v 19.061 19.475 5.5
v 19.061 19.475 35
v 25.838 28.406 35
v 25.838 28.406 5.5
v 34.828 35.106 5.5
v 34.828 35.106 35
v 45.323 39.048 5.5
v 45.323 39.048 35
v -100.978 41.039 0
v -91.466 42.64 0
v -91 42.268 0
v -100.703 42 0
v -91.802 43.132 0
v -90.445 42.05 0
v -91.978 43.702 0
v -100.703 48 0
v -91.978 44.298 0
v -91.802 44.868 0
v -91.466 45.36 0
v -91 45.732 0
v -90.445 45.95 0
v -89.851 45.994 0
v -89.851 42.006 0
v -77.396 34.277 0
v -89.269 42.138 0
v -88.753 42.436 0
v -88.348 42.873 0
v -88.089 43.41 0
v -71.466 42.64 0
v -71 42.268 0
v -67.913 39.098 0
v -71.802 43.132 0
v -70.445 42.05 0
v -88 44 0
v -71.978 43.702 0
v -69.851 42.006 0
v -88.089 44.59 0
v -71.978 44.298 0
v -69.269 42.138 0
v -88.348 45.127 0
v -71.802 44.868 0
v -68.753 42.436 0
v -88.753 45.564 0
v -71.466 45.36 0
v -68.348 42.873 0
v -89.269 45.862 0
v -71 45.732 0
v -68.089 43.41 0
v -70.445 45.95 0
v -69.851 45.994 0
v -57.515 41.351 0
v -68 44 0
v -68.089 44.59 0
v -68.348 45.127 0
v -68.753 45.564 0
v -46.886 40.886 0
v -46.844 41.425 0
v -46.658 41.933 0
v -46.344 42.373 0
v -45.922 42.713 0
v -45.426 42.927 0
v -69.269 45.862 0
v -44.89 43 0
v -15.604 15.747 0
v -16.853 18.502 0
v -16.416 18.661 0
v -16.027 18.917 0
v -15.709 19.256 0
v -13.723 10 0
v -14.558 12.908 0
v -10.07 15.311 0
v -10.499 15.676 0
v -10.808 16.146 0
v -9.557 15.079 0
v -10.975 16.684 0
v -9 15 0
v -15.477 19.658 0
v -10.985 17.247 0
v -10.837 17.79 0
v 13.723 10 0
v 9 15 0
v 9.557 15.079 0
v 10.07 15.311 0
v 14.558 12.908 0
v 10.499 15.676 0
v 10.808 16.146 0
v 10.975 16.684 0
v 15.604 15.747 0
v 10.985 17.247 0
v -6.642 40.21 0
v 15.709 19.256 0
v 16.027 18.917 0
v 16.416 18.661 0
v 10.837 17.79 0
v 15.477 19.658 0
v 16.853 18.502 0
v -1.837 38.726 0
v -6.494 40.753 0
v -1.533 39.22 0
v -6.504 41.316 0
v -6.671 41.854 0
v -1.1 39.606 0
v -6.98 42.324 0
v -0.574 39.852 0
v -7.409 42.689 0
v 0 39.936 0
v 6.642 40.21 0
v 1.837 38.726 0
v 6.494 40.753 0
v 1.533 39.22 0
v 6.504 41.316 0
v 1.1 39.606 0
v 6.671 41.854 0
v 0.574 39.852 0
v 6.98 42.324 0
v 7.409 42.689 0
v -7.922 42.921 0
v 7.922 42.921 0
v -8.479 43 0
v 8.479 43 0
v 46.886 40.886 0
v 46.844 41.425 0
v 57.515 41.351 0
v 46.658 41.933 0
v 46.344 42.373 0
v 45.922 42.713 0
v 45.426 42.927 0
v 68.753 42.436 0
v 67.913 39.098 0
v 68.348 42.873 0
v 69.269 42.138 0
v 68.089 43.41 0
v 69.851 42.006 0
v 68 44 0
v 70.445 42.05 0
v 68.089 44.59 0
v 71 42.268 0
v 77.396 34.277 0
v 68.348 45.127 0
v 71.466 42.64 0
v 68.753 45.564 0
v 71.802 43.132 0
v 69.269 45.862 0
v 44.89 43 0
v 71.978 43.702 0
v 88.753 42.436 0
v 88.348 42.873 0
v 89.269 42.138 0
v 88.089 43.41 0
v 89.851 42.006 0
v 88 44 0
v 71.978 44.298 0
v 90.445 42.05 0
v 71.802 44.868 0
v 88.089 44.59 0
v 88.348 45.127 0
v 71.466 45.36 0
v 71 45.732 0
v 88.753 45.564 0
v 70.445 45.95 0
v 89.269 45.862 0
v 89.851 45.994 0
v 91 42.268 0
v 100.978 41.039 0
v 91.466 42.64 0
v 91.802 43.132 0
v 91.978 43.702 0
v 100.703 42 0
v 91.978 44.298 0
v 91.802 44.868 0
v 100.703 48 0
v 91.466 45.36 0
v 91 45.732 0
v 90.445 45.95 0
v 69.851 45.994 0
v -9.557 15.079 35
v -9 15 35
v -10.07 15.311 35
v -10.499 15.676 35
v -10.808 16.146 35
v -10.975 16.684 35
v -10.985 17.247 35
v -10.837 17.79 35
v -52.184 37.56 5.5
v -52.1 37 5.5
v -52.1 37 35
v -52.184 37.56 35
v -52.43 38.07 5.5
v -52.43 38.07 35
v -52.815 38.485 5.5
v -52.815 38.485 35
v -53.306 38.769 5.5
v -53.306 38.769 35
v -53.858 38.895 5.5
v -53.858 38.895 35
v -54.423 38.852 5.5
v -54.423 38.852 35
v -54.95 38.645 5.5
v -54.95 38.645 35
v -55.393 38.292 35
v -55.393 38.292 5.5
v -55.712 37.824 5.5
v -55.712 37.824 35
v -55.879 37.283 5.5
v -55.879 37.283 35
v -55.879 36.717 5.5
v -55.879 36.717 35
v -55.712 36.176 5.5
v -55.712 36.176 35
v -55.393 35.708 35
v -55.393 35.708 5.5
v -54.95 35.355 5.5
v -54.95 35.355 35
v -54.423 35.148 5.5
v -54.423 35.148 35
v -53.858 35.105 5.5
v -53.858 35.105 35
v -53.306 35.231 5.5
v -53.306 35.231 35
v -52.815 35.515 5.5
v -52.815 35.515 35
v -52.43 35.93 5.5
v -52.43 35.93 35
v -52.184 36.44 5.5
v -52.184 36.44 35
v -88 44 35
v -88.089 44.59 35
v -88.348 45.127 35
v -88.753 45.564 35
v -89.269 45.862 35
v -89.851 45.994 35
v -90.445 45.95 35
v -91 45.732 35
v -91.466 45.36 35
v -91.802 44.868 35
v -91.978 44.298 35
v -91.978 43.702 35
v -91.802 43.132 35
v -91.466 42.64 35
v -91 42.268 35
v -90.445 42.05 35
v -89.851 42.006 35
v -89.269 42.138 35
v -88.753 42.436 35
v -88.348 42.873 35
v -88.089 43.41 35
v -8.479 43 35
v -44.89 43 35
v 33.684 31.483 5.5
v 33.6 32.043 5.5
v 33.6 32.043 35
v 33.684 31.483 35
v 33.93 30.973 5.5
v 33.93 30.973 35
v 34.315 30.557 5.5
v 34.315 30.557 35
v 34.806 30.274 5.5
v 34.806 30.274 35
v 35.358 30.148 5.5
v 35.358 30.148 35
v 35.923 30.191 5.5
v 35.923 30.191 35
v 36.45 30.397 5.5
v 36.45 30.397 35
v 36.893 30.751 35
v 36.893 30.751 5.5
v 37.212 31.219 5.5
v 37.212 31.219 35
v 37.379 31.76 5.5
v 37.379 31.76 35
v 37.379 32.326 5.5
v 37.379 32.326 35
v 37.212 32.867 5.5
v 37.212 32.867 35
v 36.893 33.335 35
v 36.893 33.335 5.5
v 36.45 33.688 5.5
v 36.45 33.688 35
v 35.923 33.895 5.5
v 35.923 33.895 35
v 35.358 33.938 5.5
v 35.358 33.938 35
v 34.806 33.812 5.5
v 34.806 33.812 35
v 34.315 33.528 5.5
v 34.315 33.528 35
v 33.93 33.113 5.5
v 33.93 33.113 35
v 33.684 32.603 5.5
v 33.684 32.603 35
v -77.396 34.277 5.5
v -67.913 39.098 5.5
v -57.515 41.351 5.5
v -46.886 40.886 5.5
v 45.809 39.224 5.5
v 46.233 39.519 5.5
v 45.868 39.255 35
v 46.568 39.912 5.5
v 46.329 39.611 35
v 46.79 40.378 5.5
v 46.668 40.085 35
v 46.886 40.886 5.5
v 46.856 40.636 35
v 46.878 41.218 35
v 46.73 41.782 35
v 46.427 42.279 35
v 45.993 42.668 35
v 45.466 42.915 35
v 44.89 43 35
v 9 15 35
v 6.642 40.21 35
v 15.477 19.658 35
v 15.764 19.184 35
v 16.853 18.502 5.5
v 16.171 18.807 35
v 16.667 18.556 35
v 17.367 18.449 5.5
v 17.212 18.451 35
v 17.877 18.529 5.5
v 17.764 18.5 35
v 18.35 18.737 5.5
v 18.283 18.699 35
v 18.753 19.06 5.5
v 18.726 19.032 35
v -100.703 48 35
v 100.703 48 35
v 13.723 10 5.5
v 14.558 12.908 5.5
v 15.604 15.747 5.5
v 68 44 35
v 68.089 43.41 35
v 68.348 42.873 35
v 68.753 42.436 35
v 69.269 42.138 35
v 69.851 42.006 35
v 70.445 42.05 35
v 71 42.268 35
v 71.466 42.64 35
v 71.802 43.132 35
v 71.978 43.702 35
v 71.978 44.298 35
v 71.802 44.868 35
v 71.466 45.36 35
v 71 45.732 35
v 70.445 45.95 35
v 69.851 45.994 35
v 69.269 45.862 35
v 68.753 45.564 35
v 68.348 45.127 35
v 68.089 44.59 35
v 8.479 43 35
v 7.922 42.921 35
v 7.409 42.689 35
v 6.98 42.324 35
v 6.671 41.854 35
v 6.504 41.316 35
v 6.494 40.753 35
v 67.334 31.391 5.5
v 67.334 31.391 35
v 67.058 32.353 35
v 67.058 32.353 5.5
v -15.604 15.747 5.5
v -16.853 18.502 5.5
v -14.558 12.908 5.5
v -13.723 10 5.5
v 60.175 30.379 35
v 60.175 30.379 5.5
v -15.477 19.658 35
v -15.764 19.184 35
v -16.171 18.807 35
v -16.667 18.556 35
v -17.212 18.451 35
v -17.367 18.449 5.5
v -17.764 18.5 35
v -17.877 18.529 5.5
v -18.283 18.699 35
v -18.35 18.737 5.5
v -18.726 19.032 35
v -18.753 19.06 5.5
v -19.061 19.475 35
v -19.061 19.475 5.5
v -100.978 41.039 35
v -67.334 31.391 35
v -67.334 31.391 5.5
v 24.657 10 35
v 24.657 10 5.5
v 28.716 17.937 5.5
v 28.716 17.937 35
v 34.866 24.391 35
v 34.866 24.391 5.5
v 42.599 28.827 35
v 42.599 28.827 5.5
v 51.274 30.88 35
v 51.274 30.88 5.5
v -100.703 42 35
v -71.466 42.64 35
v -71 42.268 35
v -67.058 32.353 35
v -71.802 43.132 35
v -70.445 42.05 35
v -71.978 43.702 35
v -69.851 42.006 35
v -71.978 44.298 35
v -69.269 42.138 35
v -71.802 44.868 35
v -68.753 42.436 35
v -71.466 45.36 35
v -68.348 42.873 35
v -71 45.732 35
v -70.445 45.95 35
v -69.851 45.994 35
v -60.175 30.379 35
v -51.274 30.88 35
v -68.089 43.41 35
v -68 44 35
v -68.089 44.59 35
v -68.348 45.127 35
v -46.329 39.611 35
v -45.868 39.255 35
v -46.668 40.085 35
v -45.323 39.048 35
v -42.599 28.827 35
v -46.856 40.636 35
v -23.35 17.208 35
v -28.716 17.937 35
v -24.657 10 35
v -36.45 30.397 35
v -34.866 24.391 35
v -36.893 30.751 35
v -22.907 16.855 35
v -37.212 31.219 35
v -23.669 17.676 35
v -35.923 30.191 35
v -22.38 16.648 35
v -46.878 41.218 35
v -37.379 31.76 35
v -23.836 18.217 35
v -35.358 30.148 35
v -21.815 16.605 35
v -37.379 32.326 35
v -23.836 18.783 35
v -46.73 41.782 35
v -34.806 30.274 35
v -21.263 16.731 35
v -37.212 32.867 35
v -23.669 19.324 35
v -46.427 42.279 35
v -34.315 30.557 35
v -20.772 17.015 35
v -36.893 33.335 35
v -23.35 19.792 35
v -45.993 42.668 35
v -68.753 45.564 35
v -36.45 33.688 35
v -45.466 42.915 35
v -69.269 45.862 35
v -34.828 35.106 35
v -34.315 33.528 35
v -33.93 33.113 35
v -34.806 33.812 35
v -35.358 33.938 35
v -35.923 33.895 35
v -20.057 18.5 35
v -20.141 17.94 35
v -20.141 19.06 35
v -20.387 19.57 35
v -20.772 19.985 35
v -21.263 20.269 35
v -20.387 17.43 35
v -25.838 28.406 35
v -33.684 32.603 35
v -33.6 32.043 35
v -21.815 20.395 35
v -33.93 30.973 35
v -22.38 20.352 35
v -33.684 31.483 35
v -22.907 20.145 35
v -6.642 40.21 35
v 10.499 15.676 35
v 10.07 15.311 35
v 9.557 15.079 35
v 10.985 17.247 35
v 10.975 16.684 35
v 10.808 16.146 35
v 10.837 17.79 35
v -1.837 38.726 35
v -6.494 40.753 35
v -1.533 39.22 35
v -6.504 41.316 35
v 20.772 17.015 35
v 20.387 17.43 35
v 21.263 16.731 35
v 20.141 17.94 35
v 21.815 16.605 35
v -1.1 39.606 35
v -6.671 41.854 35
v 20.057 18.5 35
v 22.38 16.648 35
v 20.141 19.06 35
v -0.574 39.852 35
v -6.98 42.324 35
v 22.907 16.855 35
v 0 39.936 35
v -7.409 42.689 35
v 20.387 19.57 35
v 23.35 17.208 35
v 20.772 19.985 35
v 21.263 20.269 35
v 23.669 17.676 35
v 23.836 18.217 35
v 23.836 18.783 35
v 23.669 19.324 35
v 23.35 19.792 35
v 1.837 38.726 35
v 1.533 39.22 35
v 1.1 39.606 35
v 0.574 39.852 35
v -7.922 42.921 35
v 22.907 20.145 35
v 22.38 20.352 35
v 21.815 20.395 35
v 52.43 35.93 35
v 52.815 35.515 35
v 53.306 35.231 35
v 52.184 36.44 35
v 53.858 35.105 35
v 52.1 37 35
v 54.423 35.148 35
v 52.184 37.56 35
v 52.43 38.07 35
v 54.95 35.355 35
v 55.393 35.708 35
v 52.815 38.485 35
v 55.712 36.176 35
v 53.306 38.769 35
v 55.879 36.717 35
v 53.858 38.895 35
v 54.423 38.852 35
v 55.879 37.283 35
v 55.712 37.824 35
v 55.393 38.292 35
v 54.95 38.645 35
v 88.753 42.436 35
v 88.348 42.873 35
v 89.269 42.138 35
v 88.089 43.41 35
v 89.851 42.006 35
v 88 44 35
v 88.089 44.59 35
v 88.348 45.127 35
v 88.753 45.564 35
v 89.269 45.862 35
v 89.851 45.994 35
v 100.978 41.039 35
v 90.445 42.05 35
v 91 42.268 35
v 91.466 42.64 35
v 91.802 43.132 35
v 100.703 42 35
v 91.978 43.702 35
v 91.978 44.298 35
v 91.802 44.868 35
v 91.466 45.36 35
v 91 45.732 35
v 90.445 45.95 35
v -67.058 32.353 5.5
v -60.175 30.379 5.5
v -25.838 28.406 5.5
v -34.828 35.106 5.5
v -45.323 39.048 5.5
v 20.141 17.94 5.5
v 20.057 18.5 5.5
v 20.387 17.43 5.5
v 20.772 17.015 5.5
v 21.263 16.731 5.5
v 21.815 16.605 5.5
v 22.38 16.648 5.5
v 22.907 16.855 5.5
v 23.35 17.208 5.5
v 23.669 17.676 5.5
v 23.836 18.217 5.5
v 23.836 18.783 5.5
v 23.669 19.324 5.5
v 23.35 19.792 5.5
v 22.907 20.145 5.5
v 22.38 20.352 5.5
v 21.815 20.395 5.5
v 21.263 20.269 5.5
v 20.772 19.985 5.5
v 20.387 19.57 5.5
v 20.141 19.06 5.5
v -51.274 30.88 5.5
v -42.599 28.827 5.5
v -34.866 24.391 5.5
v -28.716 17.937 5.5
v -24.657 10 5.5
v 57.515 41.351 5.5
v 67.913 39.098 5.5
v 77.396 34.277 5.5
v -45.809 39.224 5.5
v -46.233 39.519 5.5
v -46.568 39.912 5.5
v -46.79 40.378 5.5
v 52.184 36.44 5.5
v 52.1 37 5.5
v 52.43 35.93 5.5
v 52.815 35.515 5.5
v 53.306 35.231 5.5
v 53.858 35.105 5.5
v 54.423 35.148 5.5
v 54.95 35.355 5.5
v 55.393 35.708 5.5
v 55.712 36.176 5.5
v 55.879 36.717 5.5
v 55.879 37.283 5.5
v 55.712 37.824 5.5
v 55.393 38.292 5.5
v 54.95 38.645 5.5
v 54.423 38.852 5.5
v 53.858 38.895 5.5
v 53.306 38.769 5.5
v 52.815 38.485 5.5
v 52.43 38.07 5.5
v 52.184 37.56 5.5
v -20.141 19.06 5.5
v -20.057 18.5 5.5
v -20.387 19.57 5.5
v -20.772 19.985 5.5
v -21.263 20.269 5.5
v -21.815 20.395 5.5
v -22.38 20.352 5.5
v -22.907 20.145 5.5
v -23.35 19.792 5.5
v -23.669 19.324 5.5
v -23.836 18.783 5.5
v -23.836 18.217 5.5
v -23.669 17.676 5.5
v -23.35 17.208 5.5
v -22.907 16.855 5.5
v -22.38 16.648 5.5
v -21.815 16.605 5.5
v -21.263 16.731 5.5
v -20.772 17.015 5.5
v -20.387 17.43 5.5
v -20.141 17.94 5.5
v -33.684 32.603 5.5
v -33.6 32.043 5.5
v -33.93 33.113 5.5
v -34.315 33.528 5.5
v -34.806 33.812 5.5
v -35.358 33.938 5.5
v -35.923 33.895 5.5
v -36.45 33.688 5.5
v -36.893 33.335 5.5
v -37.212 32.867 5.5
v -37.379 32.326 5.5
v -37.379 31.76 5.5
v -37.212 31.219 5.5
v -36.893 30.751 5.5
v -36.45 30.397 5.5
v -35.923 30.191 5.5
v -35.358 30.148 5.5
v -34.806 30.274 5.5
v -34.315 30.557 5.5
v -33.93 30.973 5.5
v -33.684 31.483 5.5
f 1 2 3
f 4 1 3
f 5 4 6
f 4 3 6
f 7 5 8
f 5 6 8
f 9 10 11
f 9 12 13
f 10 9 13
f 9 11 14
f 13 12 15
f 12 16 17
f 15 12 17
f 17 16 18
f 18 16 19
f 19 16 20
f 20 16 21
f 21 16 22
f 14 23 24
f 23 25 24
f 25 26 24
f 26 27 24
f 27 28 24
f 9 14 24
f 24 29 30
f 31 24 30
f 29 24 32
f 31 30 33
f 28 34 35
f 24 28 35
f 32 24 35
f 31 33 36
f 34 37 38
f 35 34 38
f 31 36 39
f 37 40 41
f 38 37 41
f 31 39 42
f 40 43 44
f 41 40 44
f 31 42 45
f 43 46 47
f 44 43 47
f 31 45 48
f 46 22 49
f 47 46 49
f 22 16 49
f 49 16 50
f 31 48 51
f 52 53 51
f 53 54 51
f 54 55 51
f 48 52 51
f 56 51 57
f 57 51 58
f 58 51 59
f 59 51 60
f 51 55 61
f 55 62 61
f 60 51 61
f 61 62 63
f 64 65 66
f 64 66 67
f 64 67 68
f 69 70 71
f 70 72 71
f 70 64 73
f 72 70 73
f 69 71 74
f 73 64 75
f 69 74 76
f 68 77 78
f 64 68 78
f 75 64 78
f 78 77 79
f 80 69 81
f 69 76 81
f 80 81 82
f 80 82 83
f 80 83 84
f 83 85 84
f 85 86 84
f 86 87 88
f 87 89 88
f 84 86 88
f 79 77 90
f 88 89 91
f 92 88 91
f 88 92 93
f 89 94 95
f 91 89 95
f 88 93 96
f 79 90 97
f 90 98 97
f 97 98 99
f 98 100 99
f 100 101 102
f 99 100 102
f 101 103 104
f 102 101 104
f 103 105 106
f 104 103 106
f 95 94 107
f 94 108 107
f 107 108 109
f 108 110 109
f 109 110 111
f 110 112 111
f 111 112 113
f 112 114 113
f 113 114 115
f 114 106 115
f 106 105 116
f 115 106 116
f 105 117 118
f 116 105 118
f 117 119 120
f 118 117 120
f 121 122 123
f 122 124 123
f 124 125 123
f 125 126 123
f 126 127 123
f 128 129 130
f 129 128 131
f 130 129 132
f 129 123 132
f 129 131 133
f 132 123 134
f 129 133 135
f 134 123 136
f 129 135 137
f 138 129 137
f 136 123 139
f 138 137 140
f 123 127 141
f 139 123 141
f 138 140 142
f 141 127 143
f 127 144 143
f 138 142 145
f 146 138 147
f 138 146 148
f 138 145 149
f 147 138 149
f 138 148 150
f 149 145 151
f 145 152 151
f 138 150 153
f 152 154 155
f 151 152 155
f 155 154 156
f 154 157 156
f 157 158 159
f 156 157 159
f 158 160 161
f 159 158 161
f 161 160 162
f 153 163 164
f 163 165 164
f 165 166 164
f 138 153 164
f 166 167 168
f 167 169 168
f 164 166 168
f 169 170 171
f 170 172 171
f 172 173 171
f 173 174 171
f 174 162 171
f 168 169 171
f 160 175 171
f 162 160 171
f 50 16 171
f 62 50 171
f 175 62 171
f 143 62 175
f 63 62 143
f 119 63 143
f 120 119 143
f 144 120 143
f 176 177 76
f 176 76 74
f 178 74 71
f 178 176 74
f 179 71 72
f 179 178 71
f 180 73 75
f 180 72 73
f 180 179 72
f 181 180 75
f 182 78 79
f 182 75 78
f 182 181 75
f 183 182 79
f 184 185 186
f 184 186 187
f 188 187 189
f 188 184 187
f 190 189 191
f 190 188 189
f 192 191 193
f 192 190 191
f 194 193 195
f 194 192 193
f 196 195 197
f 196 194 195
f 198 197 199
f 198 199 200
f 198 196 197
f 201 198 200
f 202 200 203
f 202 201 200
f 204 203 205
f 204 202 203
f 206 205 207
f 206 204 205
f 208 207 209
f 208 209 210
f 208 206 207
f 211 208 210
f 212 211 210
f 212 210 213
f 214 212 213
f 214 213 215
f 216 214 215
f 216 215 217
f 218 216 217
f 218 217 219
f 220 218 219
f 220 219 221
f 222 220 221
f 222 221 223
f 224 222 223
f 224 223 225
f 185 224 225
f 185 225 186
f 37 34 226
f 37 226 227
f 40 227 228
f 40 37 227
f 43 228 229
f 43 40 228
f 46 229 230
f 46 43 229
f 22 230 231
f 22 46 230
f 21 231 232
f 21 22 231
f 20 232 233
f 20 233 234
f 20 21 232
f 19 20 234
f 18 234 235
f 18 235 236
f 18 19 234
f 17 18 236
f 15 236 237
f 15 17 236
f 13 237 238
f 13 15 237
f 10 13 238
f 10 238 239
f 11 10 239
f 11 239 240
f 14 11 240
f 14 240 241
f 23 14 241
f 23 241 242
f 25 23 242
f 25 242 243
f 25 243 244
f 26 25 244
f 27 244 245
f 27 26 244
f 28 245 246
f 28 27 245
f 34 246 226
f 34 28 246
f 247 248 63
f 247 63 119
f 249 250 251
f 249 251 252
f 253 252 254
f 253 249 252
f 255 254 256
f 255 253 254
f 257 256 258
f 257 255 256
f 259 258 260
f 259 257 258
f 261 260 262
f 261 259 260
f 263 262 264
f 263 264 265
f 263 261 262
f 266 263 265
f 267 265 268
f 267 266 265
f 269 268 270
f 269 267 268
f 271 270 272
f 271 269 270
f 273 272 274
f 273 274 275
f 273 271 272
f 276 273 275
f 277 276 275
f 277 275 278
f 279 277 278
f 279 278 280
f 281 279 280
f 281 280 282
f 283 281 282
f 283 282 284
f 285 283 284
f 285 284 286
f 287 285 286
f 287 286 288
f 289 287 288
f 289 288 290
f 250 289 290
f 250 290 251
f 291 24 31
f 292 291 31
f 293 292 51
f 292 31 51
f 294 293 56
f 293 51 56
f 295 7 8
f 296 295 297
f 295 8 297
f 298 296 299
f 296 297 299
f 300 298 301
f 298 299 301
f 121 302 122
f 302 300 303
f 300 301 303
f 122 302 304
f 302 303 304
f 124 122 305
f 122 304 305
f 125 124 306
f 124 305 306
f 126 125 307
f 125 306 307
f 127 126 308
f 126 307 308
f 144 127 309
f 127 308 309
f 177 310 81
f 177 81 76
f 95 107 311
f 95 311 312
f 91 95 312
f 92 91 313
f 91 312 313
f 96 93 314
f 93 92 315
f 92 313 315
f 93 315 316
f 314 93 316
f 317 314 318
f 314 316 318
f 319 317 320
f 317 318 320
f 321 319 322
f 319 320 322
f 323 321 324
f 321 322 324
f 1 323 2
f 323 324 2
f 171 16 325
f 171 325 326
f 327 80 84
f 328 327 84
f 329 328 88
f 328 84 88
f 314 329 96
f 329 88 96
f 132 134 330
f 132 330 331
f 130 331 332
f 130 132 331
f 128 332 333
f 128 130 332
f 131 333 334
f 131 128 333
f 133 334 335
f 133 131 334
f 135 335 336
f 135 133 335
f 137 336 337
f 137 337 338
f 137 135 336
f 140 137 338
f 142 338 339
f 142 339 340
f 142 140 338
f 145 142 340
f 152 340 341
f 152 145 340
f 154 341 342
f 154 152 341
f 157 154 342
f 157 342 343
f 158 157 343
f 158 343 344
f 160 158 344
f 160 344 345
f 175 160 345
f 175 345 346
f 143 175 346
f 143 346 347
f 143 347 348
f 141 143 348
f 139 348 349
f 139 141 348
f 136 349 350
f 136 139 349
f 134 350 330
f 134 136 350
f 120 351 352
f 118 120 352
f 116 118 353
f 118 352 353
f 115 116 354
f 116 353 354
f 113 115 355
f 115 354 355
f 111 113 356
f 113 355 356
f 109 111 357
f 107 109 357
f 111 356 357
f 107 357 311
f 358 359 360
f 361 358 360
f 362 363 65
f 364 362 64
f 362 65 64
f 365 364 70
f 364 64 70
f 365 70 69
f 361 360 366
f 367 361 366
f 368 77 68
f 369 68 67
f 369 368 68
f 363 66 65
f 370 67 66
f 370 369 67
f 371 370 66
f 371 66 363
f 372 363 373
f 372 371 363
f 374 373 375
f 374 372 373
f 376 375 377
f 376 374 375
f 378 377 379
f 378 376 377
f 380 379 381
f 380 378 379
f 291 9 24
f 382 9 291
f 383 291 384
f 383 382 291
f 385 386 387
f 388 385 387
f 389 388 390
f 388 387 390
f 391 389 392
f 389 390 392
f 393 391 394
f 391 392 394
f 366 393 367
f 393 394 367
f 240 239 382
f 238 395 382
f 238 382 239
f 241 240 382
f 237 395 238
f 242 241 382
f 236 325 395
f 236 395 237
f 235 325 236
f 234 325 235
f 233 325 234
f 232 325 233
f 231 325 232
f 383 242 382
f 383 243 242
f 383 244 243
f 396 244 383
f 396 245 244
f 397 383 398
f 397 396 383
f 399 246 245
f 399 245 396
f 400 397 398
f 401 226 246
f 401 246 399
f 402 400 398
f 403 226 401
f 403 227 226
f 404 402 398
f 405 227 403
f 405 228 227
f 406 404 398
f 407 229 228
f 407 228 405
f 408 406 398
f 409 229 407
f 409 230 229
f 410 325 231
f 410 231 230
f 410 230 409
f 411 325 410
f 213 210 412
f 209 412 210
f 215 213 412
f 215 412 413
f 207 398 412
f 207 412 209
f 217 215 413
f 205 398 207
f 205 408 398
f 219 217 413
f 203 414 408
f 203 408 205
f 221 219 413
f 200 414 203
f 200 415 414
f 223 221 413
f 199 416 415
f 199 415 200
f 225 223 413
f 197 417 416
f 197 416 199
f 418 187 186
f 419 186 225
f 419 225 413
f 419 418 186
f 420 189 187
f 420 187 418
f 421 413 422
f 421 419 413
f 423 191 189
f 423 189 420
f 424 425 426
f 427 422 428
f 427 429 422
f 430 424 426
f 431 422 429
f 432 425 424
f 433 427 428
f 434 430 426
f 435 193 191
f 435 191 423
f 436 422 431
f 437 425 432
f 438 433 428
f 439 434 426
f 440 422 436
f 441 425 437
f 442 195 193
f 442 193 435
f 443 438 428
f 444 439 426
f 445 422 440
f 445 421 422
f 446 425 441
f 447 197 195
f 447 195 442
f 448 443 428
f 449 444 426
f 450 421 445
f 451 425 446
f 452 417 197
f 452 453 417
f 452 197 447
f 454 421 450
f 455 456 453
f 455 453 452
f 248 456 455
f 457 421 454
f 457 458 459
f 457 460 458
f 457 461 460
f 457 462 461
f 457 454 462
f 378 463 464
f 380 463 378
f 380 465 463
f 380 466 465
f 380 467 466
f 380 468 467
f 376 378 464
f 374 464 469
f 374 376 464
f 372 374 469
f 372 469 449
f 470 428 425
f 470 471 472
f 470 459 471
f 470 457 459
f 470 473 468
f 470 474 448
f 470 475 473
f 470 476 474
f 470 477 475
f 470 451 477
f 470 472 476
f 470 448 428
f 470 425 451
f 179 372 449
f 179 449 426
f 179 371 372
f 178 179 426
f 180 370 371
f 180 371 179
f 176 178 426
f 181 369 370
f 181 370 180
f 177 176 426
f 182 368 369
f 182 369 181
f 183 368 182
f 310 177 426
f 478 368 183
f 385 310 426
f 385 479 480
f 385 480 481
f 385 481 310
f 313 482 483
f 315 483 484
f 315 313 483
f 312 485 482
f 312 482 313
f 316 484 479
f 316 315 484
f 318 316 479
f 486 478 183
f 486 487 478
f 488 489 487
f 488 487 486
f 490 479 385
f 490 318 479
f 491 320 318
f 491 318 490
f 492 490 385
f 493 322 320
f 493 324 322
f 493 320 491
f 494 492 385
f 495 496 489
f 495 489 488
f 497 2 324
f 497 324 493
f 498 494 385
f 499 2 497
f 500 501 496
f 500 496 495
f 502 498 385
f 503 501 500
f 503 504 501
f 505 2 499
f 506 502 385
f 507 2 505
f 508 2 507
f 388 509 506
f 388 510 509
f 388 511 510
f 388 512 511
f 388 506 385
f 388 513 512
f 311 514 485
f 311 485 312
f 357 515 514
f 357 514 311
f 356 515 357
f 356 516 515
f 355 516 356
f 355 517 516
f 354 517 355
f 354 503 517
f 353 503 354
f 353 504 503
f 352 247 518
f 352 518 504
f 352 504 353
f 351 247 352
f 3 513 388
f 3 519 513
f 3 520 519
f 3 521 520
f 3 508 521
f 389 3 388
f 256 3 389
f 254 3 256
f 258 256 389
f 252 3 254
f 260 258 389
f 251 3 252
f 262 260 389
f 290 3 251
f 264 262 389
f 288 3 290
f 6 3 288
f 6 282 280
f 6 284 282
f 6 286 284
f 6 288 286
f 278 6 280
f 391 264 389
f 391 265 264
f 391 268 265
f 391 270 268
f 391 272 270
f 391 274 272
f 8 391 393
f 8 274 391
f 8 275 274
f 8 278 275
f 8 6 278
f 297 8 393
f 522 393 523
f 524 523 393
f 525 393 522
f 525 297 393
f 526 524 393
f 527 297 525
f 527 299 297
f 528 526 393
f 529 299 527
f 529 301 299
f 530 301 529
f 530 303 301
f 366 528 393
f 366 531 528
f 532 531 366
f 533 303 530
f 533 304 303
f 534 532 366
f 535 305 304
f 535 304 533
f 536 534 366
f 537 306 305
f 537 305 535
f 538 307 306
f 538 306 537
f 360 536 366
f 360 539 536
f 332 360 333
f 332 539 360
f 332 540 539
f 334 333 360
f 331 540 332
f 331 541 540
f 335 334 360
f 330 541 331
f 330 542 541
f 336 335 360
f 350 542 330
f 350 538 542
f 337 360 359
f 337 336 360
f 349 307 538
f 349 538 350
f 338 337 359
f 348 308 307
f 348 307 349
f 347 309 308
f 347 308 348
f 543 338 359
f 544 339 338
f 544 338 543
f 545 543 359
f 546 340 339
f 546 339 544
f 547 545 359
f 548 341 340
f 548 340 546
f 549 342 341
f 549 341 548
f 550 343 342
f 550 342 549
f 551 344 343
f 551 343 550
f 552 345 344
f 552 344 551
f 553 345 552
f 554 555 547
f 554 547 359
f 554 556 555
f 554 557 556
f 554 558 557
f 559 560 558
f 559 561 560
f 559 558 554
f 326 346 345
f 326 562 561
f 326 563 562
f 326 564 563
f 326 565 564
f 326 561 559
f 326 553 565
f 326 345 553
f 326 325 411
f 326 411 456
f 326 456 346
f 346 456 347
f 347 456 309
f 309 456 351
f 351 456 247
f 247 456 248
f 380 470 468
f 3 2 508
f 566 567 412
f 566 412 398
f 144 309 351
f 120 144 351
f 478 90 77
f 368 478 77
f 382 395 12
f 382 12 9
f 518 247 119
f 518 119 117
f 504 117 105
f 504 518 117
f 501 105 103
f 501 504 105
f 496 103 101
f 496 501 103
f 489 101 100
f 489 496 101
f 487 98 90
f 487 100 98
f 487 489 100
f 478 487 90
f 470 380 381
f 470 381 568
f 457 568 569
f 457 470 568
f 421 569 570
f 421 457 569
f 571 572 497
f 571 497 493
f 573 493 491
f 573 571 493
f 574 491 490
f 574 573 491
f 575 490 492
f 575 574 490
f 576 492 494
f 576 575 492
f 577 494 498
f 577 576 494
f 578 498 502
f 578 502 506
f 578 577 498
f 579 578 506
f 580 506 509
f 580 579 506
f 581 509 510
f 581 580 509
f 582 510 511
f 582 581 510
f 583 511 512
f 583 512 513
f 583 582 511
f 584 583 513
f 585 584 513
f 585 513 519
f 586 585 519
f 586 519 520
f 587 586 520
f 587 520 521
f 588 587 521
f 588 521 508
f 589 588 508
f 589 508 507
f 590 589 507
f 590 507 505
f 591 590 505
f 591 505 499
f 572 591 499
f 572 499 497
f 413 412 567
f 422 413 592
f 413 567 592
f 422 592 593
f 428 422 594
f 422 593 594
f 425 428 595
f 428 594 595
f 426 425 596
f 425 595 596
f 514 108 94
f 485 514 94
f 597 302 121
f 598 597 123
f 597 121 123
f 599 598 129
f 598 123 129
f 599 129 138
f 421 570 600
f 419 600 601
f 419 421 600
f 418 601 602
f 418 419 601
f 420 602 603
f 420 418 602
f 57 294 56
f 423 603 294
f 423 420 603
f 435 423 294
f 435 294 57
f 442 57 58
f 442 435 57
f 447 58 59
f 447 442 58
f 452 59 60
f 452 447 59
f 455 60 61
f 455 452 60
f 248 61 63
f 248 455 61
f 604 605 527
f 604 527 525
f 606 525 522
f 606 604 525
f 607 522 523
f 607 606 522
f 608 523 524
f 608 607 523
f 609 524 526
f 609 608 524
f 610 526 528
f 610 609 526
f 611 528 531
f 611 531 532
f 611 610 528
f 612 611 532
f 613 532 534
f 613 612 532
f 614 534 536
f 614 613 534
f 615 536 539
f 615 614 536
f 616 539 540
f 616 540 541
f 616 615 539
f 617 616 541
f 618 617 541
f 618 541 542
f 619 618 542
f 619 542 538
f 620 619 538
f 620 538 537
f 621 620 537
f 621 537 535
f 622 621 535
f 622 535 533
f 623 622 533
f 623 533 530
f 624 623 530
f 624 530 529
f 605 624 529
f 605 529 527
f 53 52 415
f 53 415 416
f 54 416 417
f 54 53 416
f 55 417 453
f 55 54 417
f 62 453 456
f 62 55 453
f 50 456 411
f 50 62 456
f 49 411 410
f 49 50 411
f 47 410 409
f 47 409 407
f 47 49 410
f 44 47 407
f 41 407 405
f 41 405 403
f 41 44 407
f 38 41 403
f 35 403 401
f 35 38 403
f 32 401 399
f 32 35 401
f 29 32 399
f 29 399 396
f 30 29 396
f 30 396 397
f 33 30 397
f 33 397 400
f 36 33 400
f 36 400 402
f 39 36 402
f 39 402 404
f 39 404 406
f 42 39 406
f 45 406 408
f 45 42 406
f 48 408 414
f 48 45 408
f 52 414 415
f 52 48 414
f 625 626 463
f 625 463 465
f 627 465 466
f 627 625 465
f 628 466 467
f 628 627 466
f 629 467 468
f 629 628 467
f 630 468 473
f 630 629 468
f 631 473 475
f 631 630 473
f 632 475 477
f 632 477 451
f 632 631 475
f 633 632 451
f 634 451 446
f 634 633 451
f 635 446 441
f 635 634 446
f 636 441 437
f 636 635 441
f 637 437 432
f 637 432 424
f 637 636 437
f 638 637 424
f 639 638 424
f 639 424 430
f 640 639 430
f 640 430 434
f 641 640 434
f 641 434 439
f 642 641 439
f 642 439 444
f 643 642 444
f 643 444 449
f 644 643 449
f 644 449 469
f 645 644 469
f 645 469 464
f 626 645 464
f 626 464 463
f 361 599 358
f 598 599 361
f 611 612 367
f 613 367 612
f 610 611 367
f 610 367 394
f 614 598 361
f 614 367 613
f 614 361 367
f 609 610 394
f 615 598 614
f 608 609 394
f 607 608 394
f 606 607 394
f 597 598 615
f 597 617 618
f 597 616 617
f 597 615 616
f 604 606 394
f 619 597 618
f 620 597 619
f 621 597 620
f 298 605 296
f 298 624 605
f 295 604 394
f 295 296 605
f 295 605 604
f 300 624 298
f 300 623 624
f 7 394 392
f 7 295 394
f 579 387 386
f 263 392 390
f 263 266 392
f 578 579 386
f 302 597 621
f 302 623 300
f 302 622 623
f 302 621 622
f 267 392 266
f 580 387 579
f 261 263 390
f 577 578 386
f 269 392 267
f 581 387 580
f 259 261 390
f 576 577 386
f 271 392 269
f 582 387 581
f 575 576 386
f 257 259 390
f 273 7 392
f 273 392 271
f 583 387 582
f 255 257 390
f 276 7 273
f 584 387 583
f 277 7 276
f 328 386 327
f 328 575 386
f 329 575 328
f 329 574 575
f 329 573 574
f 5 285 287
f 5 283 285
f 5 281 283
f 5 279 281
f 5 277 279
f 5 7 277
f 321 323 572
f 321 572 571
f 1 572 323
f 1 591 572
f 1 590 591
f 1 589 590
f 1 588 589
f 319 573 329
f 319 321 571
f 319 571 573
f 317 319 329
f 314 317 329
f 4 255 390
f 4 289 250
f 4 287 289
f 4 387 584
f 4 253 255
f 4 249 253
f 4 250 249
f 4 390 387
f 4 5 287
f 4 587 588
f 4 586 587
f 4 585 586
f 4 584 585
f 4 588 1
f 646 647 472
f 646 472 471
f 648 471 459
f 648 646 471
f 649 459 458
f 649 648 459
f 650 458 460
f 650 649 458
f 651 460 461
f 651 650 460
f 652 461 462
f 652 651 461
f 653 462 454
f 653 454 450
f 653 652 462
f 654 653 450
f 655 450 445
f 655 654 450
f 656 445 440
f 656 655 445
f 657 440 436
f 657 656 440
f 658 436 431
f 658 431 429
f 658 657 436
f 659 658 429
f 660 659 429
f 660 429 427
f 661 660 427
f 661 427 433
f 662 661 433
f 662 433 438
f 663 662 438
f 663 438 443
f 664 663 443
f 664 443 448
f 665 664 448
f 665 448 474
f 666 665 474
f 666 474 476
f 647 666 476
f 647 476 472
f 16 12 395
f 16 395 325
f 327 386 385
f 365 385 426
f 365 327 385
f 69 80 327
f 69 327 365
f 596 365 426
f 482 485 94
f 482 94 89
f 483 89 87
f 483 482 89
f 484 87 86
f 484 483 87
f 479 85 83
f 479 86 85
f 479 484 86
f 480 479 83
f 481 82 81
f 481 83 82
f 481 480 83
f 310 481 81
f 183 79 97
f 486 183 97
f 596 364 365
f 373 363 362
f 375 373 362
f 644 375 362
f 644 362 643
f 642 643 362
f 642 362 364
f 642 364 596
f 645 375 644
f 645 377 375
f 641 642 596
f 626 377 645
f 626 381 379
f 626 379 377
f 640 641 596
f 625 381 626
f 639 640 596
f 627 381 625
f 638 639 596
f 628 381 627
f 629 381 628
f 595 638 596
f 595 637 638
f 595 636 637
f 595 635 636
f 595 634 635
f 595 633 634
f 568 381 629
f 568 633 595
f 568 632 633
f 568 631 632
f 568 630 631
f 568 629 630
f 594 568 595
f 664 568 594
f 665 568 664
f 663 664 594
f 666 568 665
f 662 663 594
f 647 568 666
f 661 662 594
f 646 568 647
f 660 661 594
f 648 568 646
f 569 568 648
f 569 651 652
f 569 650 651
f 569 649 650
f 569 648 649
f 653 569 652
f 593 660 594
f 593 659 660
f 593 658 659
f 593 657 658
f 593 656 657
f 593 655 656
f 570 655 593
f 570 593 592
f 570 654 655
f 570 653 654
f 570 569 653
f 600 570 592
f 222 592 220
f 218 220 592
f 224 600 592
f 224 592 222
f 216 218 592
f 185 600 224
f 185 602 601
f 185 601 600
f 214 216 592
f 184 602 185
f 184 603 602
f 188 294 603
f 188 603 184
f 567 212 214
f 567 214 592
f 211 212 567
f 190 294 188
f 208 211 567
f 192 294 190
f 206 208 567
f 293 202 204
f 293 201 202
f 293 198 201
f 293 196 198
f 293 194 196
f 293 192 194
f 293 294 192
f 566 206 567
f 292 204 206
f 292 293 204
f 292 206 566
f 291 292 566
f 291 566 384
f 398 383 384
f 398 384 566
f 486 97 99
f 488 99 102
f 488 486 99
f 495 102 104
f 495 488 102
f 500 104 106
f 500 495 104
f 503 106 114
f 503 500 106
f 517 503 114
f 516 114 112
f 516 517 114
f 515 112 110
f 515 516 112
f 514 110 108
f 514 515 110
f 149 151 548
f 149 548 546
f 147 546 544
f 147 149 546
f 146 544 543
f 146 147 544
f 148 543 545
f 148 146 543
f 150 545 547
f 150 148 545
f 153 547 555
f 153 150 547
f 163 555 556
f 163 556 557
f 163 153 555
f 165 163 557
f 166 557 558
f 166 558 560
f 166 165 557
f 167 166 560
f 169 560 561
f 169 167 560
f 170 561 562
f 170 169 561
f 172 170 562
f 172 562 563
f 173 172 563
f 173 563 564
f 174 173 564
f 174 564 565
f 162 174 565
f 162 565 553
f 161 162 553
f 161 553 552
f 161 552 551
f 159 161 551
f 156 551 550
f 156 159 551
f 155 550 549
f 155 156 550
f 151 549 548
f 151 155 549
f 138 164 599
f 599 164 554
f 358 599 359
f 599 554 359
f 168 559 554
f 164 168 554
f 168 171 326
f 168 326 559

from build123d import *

# Parameters (mm, degrees)
SKETCH_1_R          = 1.9
SKETCH_1_R_2        = 2
EXTRUDE_1_DEPTH     = 35
EXTRUDE_2_DEPTH     = 35
CUT_EXTRUDE_1_DEPTH = 118.156356153
SKETCH_4_R          = 41.5
CUT_EXTRUDE_2_DEPTH = 5.5
SKETCH_5_R          = 31
CUT_EXTRUDE_3_DEPTH = 116.632442624


with BuildPart() as part:
    # 草图1 → 凸台-拉伸1 (new body)
    with BuildSketch(Plane.XY):
        with BuildLine():
            Line((-46.419972715, 26.434696638), (-100.702636481, 42))
            Line((-100.702636481, 42), (-100.702636481, 48))
            Line((-100.702636481, 48), (100.702636481, 48))
            Line((100.702636481, 48), (100.702636481, 42))
            Line((100.702636481, 42), (46.419972715, 26.434696638))
            ThreePointArc((46.419972715, 26.434696638), (35.478614393, 20.327525063), (28.382623085, 10))
            Line((28.382623085, 10), (-28.382623085, 10))
            ThreePointArc((-28.382623085, 10), (-35.478614393, 20.327525063), (-46.419972715, 26.434696638))
        make_face()
        with Locations((-54, 37)):
            Circle(SKETCH_1_R, mode=Mode.SUBTRACT)
        with Locations((-35.5, 32.04293994)):
            Circle(SKETCH_1_R, mode=Mode.SUBTRACT)
        with Locations((-21.95706006, 18.5)):
            Circle(SKETCH_1_R, mode=Mode.SUBTRACT)
        with Locations(Location((21.95706006, 18.5, 0), (0, 0, 180))):
            Circle(SKETCH_1_R, mode=Mode.SUBTRACT)
        with Locations(Location((35.5, 32.04293994, 0), (0, 0, 180))):
            Circle(SKETCH_1_R, mode=Mode.SUBTRACT)
        with Locations(Location((54, 37, 0), (0, 0, 180))):
            Circle(SKETCH_1_R, mode=Mode.SUBTRACT)
        with Locations((-90, 44)):
            Circle(SKETCH_1_R_2, mode=Mode.SUBTRACT)
        with Locations((-70, 44)):
            Circle(SKETCH_1_R_2, mode=Mode.SUBTRACT)
        with Locations(Location((70, 44, 0), (0, 0, 180))):
            Circle(SKETCH_1_R_2, mode=Mode.SUBTRACT)
        with Locations(Location((90, 44, 0), (0, 0, 180))):
            Circle(SKETCH_1_R_2, mode=Mode.SUBTRACT)
    extrude(amount=EXTRUDE_1_DEPTH)

    # 草图2 → 凸台-拉伸2 (add)
    with BuildSketch(Plane.XY.offset(35)):
        Polygon((-100.702636481, 42), (-100.978273837, 41.038738304), (-67.334114479, 31.39143085), (-67.058477124, 32.352692546), align=None)
        Polygon((67.058477124, 32.352692546), (100.702636481, 42), (100.978273837, 41.038738304), (67.334114479, 31.39143085), align=None)
    extrude(amount=-EXTRUDE_2_DEPTH)

    # 草图3 → 切除-拉伸1 (cut, through all)
    with BuildSketch(Plane.XY.offset(35)):
        with BuildLine():
            Line((-6.641746516, 40.210125207), (-15.476556882, 19.658485028))
            ThreePointArc((-15.476556882, 19.658485028), (-17.211519663, 18.450985714), (-19.06092662, 19.474628401))
            ThreePointArc((-19.06092662, 19.474628401), (-30.09691848, 32.072460053), (-45.323396591, 39.047619048))
            ThreePointArc((-45.323396591, 39.047619048), (-46.877626016, 41.21821789), (-44.889566421, 43))
            Line((-44.889566421, 43), (-8.479162585, 43))
            ThreePointArc((-8.479162585, 43), (-6.808870756, 42.100056911), (-6.641746516, 40.210125207))
        make_face()
        with BuildLine():
            Line((-10.837416069, 17.789874793), (-1.837416069, 38.725781047))
            ThreePointArc((-1.837416069, 38.725781047), (0, 39.935906254), (1.837416069, 38.725781047))
            Line((1.837416069, 38.725781047), (10.837416069, 17.789874793))
            ThreePointArc((10.837416069, 17.789874793), (10.670291829, 15.899943089), (9, 15))
            Line((9, 15), (-9, 15))
            ThreePointArc((-9, 15), (-10.670291829, 15.899943089), (-10.837416069, 17.789874793))
        make_face()
        with BuildLine():
            Line((44.889566421, 43), (8.479162585, 43))
            ThreePointArc((8.479162585, 43), (6.808870756, 42.100056911), (6.641746516, 40.210125207))
            Line((6.641746516, 40.210125207), (15.476556882, 19.658485028))
            ThreePointArc((15.476556882, 19.658485028), (17.211519663, 18.450985714), (19.06092662, 19.474628401))
            ThreePointArc((19.06092662, 19.474628401), (30.09691848, 32.072460053), (45.323396591, 39.047619048))
            ThreePointArc((45.323396591, 39.047619048), (46.877626016, 41.21821789), (44.889566421, 43))
        make_face()
    extrude(amount=-CUT_EXTRUDE_1_DEPTH, mode=Mode.SUBTRACT)

    # 草图4 → 切除-拉伸2 (cut)
    with BuildSketch(Plane(origin=(0, 0, 0), x_dir=(-1, 0, 0), z_dir=(0, 0, -1))):
        with Locations((54, 0)):
            Circle(SKETCH_4_R)
        with Locations((-54, 0)):
            Circle(SKETCH_4_R)
    extrude(amount=-CUT_EXTRUDE_2_DEPTH, mode=Mode.SUBTRACT)

    # 草图5 → 切除-拉伸3 (cut, through all)
    with BuildSketch(Plane(origin=(0, 0, 5.5), x_dir=(-1, 0, 0), z_dir=(0, 0, -1))):
        with Locations((-54, 0)):
            Circle(SKETCH_5_R)
        with Locations((54, 0)):
            Circle(SKETCH_5_R)
    extrude(amount=-CUT_EXTRUDE_3_DEPTH, mode=Mode.SUBTRACT)


solid = part.part
